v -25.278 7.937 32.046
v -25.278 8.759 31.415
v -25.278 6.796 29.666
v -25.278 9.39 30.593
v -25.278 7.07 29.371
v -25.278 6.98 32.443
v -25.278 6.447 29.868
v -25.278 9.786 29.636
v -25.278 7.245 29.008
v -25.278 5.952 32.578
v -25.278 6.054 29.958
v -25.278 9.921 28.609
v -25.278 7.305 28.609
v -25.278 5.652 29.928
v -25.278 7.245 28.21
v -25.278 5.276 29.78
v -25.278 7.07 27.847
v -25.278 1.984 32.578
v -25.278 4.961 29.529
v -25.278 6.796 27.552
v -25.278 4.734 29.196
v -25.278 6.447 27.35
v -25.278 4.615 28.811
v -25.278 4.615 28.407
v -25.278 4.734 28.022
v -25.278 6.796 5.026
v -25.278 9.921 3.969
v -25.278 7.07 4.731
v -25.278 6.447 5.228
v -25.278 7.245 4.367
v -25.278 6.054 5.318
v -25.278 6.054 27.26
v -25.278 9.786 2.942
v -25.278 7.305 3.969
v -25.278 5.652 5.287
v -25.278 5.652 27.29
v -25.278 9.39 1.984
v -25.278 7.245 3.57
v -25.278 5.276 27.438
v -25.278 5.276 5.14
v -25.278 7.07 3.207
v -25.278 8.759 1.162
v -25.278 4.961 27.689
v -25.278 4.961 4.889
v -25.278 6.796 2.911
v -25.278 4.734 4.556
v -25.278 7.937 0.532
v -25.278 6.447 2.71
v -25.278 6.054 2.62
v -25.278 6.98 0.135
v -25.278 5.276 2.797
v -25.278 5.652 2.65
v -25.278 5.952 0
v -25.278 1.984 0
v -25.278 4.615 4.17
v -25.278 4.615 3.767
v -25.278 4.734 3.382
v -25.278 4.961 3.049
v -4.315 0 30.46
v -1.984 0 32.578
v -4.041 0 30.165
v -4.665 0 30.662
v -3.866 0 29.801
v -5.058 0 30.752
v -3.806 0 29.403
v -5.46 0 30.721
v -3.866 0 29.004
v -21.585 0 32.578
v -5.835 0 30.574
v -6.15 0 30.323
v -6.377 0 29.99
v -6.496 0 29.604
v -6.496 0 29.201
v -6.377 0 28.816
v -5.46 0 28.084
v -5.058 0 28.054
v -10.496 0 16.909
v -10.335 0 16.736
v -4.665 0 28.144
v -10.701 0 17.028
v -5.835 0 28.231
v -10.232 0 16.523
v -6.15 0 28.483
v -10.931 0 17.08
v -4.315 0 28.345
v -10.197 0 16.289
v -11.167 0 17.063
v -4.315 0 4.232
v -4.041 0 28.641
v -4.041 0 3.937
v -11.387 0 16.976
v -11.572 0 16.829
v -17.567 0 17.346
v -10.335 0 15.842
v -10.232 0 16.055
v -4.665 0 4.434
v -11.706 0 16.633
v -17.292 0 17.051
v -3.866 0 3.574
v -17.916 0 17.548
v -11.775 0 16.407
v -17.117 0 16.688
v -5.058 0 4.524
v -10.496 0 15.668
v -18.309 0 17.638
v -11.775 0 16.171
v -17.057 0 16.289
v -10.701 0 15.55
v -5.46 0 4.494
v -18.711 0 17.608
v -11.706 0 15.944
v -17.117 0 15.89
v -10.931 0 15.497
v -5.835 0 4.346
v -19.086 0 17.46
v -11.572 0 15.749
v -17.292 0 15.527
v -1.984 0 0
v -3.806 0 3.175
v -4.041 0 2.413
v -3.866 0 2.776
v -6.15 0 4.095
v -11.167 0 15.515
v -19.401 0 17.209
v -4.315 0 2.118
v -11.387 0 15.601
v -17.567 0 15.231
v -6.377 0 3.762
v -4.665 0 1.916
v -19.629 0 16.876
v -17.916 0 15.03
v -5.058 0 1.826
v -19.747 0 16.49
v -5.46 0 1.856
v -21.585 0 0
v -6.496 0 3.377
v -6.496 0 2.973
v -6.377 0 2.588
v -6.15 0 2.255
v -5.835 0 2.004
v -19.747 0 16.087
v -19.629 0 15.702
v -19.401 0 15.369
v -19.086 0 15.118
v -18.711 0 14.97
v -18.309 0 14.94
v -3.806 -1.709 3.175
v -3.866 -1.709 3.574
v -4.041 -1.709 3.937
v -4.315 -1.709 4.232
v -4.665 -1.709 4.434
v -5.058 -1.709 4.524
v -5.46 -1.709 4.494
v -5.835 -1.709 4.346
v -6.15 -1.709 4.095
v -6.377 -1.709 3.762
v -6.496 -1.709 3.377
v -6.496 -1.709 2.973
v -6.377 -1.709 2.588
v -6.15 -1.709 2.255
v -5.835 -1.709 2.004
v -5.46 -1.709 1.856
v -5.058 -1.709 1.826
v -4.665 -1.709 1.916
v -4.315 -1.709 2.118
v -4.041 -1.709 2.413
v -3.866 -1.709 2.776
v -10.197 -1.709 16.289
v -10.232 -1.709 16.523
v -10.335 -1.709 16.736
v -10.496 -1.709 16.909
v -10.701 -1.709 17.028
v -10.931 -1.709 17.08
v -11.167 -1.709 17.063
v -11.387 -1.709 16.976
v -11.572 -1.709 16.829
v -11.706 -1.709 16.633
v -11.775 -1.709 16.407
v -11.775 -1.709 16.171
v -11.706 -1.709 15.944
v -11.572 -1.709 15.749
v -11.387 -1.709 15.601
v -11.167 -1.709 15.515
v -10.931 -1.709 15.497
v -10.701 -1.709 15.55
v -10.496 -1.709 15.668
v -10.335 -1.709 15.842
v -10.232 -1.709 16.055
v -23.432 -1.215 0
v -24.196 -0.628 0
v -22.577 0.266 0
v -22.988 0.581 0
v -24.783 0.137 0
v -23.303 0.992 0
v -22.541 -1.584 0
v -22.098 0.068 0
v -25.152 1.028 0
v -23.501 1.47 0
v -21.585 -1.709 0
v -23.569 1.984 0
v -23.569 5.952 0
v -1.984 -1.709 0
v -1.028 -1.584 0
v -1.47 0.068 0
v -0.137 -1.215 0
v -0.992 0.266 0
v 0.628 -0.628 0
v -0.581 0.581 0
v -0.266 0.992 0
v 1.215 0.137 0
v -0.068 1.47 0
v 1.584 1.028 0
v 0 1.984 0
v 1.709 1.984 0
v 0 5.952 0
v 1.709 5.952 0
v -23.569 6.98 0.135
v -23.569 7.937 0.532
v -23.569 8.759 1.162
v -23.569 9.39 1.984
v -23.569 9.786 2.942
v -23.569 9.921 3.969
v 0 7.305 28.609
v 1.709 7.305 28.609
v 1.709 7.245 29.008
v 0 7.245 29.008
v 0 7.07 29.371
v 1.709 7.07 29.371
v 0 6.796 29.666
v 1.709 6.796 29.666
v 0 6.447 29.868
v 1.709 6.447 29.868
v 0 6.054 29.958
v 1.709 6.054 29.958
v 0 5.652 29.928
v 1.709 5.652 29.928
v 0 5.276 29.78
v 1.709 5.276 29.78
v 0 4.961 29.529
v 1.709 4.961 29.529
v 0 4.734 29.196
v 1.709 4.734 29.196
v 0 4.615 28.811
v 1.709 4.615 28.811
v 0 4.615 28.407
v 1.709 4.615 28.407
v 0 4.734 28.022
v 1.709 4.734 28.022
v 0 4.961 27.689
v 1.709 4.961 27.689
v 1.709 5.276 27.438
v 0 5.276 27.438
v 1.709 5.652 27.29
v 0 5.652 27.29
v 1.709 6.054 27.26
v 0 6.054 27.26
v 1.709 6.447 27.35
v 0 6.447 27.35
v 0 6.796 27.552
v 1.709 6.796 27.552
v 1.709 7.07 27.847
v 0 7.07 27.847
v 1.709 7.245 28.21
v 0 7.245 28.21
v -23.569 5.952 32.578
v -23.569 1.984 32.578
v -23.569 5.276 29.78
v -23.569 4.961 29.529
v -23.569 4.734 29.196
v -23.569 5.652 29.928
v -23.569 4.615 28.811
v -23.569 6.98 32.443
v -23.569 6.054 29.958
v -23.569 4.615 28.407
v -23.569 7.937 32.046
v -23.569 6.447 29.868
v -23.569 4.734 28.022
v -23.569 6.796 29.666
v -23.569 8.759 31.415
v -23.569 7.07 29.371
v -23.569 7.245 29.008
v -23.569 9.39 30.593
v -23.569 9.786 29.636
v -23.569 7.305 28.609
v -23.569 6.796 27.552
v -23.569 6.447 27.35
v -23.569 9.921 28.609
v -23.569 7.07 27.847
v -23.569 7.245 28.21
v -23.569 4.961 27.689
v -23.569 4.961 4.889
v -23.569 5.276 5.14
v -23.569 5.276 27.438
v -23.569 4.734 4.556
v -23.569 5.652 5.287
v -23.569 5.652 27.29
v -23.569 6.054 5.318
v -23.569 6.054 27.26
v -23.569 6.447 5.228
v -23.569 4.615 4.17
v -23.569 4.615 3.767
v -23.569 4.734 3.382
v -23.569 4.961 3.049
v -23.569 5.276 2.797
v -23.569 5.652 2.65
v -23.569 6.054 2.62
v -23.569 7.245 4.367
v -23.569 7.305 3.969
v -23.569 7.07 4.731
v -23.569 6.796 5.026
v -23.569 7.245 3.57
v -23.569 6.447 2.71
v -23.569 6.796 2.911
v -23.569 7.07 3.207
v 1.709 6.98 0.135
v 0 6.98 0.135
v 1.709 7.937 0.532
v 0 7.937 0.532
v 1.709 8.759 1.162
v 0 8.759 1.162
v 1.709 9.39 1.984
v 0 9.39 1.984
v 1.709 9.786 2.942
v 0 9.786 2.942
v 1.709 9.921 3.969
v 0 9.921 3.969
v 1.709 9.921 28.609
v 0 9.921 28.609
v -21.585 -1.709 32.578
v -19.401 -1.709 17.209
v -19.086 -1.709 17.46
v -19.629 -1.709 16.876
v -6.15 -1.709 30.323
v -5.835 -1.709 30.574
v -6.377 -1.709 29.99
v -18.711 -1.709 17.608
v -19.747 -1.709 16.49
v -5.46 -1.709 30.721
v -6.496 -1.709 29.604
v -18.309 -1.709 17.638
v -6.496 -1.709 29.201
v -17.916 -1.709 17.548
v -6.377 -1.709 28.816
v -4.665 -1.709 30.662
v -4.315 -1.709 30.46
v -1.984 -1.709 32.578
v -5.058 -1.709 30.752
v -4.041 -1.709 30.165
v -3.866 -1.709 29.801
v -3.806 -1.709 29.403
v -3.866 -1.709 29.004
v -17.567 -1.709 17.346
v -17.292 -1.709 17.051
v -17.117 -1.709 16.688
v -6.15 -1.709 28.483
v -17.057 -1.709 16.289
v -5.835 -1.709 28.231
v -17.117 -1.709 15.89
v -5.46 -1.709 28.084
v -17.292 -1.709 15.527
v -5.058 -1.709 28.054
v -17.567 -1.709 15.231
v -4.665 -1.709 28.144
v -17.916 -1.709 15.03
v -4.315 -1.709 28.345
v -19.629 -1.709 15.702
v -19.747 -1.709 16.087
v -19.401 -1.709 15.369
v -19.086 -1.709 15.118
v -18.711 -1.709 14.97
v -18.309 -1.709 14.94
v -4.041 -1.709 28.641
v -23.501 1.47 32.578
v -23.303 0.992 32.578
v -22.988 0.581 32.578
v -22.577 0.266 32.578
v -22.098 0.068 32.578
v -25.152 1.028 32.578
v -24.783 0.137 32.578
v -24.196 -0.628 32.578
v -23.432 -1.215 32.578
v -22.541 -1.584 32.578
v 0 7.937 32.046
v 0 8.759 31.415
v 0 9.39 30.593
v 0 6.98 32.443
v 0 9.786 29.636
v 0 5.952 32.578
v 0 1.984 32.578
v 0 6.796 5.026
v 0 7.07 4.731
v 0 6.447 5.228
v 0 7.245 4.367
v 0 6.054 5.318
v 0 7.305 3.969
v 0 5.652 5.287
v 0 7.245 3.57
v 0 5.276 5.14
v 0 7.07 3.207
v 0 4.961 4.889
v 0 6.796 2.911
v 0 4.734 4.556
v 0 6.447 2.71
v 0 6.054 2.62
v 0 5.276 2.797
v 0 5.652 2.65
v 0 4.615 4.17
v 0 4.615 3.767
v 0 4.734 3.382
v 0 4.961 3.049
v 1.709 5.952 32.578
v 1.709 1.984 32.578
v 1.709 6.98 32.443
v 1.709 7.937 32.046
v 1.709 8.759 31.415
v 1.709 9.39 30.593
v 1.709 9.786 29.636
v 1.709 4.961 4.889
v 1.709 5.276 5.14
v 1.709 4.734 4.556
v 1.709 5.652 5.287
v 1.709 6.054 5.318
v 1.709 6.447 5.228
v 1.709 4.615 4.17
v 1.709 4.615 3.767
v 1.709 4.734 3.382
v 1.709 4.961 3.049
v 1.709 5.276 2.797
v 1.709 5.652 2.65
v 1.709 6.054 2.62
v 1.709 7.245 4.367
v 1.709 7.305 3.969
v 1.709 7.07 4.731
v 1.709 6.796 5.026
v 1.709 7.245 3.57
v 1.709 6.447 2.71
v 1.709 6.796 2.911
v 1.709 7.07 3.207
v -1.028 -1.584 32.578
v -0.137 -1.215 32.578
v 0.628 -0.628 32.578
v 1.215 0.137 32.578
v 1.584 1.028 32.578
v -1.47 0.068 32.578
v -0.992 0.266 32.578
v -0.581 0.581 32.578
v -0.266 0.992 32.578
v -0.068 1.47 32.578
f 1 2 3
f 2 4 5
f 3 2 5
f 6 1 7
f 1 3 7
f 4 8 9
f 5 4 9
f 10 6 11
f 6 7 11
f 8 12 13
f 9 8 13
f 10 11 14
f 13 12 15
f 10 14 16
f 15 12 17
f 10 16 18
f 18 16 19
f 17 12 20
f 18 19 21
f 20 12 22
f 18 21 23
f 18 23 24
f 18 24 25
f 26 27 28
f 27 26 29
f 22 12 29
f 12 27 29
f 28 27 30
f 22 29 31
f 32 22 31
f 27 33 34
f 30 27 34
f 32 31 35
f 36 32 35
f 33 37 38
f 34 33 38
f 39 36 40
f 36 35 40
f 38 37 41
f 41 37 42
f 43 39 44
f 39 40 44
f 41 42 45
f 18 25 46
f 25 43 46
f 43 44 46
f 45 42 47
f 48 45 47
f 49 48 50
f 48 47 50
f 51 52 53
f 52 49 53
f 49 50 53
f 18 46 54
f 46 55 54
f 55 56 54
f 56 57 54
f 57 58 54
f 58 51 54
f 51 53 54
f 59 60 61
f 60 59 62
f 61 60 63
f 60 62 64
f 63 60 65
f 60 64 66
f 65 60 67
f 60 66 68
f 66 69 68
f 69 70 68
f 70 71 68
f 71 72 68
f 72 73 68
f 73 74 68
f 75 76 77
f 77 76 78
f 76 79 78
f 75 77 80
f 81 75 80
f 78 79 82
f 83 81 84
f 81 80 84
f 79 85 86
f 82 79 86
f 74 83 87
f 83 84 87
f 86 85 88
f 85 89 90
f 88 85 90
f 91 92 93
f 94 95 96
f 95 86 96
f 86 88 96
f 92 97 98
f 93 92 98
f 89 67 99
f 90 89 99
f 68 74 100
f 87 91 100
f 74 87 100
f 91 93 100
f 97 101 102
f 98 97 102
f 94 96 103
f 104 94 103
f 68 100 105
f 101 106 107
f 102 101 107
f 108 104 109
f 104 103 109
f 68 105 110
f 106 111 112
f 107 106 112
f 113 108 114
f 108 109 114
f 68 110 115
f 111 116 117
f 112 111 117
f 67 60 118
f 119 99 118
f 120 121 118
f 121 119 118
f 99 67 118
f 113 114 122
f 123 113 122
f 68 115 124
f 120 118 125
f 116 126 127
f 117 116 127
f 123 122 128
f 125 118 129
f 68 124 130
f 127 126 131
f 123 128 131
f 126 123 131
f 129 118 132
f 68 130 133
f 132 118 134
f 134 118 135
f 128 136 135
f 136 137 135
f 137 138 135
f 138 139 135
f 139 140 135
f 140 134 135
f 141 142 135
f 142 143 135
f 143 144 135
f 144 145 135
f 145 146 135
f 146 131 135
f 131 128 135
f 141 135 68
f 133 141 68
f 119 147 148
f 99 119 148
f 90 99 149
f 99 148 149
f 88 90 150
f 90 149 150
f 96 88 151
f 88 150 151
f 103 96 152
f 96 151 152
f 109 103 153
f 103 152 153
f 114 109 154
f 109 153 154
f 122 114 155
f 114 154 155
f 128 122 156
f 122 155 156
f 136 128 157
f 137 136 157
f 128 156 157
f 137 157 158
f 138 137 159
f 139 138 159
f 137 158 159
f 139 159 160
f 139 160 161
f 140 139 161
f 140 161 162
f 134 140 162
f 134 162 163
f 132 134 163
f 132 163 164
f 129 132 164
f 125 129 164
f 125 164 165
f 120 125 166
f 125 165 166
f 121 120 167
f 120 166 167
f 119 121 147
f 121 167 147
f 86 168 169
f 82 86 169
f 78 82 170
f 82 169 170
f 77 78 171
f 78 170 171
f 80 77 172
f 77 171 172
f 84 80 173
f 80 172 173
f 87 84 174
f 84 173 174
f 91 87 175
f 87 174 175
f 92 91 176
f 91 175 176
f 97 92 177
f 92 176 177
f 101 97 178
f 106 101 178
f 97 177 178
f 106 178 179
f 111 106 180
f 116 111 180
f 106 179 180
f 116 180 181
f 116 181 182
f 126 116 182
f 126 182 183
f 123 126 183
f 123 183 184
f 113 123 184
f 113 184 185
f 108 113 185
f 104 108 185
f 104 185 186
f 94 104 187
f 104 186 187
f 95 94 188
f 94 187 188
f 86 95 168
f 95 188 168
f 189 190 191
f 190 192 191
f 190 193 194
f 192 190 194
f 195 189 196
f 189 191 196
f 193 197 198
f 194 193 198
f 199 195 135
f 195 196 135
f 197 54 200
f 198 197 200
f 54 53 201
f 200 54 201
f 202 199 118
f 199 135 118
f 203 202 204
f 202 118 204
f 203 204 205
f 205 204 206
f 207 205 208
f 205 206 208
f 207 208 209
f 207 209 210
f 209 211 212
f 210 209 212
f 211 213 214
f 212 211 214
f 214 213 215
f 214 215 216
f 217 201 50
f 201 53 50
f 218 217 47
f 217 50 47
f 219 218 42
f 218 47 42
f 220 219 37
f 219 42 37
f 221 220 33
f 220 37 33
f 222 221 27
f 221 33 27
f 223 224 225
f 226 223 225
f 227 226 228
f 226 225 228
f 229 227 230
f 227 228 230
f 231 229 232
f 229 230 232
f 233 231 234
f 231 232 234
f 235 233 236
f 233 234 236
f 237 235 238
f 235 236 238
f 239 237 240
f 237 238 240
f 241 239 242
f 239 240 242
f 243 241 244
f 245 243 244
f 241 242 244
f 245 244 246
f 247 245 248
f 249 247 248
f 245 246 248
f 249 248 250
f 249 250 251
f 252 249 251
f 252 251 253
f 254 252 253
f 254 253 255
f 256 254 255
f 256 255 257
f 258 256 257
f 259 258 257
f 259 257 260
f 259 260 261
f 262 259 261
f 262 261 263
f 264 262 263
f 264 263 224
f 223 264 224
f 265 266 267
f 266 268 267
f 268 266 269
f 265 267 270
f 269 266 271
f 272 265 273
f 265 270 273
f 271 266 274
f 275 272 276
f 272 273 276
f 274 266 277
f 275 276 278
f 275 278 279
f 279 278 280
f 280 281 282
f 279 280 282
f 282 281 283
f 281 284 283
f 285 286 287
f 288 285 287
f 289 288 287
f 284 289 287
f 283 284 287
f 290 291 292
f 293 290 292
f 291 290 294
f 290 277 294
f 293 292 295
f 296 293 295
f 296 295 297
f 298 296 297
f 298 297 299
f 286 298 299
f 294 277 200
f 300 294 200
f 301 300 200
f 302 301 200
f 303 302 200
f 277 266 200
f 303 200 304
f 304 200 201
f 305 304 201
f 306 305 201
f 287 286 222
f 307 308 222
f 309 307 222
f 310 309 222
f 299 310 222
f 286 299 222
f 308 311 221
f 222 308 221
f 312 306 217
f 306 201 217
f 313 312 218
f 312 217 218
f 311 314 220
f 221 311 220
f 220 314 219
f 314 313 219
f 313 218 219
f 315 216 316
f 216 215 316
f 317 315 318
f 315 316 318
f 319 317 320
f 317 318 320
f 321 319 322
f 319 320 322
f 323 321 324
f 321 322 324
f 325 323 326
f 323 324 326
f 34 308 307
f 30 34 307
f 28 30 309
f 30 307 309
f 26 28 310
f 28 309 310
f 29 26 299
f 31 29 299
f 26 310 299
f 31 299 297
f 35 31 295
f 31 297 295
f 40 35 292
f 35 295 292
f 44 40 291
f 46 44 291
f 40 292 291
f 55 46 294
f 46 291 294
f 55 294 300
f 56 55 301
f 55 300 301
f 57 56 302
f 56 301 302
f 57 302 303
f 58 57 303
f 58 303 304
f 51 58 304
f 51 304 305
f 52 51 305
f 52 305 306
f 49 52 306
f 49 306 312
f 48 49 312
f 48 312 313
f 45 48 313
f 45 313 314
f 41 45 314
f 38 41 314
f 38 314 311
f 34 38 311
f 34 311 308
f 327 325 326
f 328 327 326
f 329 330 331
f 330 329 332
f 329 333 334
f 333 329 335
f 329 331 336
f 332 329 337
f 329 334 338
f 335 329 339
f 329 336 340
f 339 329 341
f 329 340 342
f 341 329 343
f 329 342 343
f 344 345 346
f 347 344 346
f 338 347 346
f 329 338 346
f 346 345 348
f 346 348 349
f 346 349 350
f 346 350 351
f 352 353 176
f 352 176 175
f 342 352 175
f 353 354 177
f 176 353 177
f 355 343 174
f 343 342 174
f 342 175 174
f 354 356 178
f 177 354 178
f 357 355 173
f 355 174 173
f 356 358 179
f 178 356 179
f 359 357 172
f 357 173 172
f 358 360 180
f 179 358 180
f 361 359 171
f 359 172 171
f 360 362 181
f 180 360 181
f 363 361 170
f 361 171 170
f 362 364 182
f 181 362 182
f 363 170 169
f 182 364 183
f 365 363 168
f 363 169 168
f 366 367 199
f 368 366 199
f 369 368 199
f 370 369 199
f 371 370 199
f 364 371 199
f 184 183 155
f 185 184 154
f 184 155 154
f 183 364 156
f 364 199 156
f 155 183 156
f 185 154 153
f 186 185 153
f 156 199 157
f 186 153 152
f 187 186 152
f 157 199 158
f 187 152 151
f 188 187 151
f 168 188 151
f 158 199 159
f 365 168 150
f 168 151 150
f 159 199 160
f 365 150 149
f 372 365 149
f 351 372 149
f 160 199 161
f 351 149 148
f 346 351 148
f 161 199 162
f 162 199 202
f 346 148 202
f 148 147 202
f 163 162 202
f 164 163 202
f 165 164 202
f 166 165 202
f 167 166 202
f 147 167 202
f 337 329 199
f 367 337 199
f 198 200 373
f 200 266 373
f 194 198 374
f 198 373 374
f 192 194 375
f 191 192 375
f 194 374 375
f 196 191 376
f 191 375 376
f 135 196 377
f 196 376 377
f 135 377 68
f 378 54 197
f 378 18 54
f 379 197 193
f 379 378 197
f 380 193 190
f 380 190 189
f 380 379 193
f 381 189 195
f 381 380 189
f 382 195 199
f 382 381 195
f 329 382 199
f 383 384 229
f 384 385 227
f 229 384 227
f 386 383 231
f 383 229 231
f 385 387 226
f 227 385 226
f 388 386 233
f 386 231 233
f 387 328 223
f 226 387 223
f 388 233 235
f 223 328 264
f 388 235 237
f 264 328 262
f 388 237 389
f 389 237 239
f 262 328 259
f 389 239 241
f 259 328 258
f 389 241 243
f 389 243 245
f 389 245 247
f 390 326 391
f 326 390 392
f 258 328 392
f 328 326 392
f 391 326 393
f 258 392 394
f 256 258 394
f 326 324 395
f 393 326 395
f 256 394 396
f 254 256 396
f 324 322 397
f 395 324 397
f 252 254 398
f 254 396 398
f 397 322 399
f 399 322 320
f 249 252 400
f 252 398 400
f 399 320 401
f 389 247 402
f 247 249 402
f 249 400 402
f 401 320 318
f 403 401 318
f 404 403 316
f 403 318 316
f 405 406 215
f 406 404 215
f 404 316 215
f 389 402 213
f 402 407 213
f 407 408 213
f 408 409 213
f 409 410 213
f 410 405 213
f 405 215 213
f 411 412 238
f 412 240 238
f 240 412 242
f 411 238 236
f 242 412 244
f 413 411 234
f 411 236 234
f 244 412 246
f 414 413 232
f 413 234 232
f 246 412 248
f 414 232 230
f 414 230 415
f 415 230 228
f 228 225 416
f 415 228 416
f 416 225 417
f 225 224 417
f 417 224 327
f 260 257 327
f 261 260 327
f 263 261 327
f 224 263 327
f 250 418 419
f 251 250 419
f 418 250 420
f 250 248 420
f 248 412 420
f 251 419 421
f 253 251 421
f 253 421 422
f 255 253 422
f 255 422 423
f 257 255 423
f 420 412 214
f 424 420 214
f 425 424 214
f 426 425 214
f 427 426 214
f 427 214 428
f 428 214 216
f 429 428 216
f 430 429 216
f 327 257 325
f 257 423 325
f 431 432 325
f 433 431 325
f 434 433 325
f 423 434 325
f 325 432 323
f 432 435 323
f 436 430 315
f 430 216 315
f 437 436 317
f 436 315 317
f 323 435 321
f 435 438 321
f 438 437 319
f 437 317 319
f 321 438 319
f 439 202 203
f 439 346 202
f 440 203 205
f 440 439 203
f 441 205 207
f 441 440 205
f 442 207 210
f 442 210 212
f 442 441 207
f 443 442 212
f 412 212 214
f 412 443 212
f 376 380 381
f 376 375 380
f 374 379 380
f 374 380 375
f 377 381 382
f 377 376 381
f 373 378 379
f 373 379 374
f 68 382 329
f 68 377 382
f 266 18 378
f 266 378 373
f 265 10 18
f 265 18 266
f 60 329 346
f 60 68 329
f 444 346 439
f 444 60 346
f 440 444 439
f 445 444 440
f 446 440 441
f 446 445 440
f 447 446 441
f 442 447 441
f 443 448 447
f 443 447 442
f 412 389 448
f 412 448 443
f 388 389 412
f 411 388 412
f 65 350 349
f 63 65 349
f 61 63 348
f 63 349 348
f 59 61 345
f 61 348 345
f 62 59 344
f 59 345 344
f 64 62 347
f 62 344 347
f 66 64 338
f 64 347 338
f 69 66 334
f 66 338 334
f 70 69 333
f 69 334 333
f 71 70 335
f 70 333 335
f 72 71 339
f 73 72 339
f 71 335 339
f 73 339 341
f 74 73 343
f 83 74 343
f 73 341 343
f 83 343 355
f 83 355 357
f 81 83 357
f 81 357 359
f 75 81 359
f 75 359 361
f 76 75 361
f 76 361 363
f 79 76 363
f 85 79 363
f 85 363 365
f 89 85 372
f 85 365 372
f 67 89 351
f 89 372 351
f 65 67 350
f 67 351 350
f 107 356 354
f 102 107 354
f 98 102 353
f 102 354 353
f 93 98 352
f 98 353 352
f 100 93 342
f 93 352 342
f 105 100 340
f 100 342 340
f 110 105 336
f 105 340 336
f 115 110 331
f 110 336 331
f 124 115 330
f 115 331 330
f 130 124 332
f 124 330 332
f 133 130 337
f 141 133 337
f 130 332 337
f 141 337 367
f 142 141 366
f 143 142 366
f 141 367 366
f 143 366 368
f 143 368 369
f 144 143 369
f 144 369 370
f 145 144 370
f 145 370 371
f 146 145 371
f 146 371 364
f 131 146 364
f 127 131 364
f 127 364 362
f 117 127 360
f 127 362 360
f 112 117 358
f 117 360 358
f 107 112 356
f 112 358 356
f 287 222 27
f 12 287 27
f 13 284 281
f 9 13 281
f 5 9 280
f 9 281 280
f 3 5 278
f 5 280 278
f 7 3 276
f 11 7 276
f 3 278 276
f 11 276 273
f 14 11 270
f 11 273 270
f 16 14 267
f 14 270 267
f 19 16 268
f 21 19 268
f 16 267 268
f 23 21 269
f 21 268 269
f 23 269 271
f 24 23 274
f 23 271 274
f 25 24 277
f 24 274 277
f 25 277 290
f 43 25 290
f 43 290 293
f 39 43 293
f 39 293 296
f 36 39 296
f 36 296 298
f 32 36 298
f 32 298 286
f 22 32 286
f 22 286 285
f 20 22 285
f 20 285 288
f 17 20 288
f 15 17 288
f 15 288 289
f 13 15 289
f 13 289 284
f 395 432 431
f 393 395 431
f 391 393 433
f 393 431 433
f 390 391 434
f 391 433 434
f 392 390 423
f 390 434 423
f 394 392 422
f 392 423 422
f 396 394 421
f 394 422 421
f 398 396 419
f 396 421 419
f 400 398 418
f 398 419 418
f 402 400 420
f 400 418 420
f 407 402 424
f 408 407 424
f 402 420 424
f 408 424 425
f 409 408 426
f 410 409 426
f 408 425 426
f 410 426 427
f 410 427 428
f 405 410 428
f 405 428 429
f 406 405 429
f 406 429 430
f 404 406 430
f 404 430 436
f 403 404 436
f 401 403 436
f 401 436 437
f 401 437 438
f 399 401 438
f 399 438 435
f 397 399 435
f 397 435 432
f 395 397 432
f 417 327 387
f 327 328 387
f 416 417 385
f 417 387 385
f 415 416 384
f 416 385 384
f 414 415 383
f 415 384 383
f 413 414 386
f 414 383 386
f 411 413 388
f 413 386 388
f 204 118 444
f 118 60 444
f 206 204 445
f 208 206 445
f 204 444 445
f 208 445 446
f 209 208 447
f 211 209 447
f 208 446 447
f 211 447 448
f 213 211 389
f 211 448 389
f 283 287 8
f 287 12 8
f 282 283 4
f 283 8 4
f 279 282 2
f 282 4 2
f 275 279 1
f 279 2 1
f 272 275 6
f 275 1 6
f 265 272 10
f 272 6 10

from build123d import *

# Parameters (mm, degrees)
F1_DEPTH = 32.5777606
F2_R     = 3.69316
F3_R     = 1.98374
F4_R     = 1.35255
F5_DEPTH = 26.9875
F6_R     = 3.96875
F7_R     = 0.79375
F7_R_2   = 1.35255
F8_DEPTH = 1.70942


with BuildPart() as f1:
    # F0 (on Top) → F1 (new body)
    with BuildSketch(Plane.XY):
        Polygon((0, 9.92124), (0, 0), (-23.56866, 0), (-23.56866, 9.92124), (-25.27808, 9.92124), (-25.27808, -1.70942), (1.70942, -1.70942), (1.70942, 9.92124), align=None)
    extrude(amount=F1_DEPTH)

    # F2
    f2_edges = [f1.edges().sort_by_distance(p)[0] for p in [
        (1.70942, -1.70942, 16.28888),
        (-25.27808, -1.70942, 16.28888),
    ]]
    fillet(f2_edges, radius=F2_R)

    # F3
    f3_edges = [f1.edges().sort_by_distance(p)[0] for p in [
        (0, 0, 16.28888),
        (-23.56866, 0, 16.28888),
    ]]
    fillet(f3_edges, radius=F3_R)

    # F4 (on face) → F5 (cut, through all)
    with BuildSketch(Plane.YZ.offset(1.70942)):
        with Locations((5.95249, 3.96875)):
            Circle(F4_R)
        with Locations((5.95249, 28.6090106)):
            Circle(F4_R)
    extrude(amount=-F5_DEPTH, mode=Mode.SUBTRACT)

    # F6
    f6_edges = [f1.edges().sort_by_distance(p)[0] for p in [
        (0.85471, 9.92124, 32.577761),
        (-24.42337, 9.92124, 32.577761),
        (0.85471, 9.92124, 0),
        (-24.42337, 9.92124, 0),
    ]]
    fillet(f6_edges, radius=F6_R)

    # F7 (on face) → F8 (cut, through all)
    with BuildSketch(Plane.XZ.offset(1.70942)):
        with Locations((-10.99058, 16.2888803)):
            Circle(F7_R)
        with Locations((-18.40992, 16.2888803)):
            Circle(F7_R_2)
        with Locations((-5.15874, 29.4027606)):
            Circle(F7_R_2)
        with Locations((-5.15874, 3.175)):
            Circle(F7_R_2)
    extrude(amount=-F8_DEPTH, mode=Mode.SUBTRACT)


solid = f1.part
